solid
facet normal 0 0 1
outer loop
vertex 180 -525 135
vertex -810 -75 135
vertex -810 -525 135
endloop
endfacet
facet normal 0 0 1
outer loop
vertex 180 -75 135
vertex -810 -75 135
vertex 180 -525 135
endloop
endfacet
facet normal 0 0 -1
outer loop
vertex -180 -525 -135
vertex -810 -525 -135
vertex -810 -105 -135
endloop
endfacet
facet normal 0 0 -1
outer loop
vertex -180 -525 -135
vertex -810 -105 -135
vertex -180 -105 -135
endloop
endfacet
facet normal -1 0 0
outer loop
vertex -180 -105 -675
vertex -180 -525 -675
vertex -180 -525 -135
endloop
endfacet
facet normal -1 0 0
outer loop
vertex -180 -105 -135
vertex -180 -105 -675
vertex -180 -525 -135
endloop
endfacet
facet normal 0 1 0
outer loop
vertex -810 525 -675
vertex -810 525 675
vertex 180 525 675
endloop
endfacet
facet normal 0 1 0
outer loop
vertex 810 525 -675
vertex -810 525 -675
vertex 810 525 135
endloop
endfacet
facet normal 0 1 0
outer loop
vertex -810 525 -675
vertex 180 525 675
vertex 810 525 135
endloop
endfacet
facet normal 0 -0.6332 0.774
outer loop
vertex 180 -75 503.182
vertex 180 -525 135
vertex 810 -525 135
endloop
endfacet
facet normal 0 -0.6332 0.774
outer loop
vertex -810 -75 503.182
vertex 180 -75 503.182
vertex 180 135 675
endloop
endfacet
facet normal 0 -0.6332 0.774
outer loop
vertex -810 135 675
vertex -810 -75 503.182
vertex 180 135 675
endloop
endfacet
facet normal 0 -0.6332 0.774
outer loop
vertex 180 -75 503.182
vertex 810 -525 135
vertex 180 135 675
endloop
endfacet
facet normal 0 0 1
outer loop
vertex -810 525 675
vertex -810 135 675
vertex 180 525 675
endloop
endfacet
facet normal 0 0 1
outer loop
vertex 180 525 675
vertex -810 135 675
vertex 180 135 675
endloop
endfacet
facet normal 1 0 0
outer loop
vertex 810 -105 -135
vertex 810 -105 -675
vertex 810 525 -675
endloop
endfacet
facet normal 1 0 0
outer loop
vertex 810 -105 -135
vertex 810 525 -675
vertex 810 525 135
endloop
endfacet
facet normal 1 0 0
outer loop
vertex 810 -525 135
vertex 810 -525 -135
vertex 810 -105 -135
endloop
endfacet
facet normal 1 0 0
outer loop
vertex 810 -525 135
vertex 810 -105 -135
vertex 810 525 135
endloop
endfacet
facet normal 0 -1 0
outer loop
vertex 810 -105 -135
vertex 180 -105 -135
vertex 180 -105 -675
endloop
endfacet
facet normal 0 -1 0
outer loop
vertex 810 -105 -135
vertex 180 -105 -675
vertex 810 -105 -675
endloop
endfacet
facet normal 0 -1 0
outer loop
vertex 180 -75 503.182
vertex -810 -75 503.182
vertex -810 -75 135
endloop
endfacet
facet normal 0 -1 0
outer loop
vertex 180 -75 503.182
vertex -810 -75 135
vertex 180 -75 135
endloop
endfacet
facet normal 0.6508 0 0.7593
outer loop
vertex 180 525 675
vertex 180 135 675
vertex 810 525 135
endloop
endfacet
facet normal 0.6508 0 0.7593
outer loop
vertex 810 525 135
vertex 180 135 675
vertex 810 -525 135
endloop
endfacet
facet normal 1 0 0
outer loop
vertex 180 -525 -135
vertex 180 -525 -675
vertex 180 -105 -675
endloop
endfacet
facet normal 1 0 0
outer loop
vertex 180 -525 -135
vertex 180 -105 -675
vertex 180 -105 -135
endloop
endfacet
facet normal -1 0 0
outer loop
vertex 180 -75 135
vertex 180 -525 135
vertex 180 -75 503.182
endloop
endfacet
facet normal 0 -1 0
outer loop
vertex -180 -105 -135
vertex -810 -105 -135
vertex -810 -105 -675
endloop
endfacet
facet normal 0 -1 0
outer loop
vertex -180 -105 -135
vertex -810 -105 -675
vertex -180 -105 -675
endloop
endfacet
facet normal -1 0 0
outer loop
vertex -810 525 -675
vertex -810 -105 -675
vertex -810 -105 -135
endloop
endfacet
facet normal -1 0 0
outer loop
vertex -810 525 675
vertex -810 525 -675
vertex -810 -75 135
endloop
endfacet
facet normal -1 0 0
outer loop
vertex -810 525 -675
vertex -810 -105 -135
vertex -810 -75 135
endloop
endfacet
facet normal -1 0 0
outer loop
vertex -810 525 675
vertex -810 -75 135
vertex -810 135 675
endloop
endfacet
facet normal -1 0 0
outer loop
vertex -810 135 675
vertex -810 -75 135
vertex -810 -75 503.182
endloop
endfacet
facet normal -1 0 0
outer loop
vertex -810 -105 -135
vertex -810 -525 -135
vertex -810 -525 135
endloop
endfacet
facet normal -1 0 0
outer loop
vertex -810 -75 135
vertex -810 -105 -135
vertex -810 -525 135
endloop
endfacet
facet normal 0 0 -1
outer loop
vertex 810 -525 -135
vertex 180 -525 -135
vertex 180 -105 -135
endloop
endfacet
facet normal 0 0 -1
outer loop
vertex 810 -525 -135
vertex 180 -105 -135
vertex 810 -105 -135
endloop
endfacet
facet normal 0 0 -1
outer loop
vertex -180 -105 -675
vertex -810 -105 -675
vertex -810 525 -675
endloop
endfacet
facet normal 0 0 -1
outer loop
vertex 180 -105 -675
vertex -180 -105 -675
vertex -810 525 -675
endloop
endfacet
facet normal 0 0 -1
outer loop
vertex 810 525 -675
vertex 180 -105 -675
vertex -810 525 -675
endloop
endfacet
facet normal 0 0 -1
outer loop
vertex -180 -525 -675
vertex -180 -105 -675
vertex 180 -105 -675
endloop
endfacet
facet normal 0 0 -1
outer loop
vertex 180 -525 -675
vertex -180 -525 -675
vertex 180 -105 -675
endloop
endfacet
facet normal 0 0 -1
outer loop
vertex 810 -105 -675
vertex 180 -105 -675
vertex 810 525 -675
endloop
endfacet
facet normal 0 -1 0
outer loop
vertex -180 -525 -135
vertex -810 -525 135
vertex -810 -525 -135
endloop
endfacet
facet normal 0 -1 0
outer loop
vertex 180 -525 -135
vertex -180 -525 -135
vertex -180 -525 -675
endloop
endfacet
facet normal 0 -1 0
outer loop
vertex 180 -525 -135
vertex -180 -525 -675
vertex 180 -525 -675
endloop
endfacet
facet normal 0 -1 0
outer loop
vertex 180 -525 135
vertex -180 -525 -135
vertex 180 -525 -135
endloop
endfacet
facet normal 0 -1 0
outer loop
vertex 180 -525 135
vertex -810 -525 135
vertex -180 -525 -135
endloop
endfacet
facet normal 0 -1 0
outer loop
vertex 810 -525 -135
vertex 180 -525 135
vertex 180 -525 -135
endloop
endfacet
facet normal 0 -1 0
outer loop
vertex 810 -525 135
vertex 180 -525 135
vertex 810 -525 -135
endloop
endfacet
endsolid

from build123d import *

# Parameters (mm, degrees)
F0_W     = 1620
F0_H     = 1350
F1_DEPTH = 525
F2_W     = 630
F2_H     = 540
F3_DEPTH = 420
F4_W     = 990
F4_H     = 450
F5_DEPTH = 540
F7_DEPTH = 1620.001
F9_DEPTH = 1050.001


with BuildPart() as f1:
    # F0 (on Front) → F1 (new body, symmetric)
    with BuildSketch(Plane.XZ):
        Rectangle(F0_W, F0_H)
    extrude(amount=F1_DEPTH, both=True)

    # F2 (on face) → F3 (cut)
    with BuildSketch(Plane.XZ.offset(525)):
        with Locations((-495, -405)):
            Rectangle(F2_W, F2_H)
        with Locations((495, -405)):
            Rectangle(F2_W, F2_H)
    extrude(amount=-F3_DEPTH, mode=Mode.SUBTRACT)

    # F4 (on face) → F5 (cut)
    with BuildSketch(Plane.XY.offset(675)):
        with Locations((-315, -300)):
            Rectangle(F4_W, F4_H)
    extrude(amount=-F5_DEPTH, mode=Mode.SUBTRACT)

    # F6 (on face) → F7 (cut, through all)
    with BuildSketch(Plane.YZ.offset(810)):
        Polygon((135, 675), (-525, 675), (-525, 135), align=None)
    extrude(amount=-F7_DEPTH, mode=Mode.SUBTRACT)

    # F8 (on face) → F9 (cut, through all)
    with BuildSketch(Plane.XZ.offset(525)):
        Polygon((180, 675), (810, 135), (810, 675), align=None)
    extrude(amount=-F9_DEPTH, mode=Mode.SUBTRACT)


solid = f1.part
